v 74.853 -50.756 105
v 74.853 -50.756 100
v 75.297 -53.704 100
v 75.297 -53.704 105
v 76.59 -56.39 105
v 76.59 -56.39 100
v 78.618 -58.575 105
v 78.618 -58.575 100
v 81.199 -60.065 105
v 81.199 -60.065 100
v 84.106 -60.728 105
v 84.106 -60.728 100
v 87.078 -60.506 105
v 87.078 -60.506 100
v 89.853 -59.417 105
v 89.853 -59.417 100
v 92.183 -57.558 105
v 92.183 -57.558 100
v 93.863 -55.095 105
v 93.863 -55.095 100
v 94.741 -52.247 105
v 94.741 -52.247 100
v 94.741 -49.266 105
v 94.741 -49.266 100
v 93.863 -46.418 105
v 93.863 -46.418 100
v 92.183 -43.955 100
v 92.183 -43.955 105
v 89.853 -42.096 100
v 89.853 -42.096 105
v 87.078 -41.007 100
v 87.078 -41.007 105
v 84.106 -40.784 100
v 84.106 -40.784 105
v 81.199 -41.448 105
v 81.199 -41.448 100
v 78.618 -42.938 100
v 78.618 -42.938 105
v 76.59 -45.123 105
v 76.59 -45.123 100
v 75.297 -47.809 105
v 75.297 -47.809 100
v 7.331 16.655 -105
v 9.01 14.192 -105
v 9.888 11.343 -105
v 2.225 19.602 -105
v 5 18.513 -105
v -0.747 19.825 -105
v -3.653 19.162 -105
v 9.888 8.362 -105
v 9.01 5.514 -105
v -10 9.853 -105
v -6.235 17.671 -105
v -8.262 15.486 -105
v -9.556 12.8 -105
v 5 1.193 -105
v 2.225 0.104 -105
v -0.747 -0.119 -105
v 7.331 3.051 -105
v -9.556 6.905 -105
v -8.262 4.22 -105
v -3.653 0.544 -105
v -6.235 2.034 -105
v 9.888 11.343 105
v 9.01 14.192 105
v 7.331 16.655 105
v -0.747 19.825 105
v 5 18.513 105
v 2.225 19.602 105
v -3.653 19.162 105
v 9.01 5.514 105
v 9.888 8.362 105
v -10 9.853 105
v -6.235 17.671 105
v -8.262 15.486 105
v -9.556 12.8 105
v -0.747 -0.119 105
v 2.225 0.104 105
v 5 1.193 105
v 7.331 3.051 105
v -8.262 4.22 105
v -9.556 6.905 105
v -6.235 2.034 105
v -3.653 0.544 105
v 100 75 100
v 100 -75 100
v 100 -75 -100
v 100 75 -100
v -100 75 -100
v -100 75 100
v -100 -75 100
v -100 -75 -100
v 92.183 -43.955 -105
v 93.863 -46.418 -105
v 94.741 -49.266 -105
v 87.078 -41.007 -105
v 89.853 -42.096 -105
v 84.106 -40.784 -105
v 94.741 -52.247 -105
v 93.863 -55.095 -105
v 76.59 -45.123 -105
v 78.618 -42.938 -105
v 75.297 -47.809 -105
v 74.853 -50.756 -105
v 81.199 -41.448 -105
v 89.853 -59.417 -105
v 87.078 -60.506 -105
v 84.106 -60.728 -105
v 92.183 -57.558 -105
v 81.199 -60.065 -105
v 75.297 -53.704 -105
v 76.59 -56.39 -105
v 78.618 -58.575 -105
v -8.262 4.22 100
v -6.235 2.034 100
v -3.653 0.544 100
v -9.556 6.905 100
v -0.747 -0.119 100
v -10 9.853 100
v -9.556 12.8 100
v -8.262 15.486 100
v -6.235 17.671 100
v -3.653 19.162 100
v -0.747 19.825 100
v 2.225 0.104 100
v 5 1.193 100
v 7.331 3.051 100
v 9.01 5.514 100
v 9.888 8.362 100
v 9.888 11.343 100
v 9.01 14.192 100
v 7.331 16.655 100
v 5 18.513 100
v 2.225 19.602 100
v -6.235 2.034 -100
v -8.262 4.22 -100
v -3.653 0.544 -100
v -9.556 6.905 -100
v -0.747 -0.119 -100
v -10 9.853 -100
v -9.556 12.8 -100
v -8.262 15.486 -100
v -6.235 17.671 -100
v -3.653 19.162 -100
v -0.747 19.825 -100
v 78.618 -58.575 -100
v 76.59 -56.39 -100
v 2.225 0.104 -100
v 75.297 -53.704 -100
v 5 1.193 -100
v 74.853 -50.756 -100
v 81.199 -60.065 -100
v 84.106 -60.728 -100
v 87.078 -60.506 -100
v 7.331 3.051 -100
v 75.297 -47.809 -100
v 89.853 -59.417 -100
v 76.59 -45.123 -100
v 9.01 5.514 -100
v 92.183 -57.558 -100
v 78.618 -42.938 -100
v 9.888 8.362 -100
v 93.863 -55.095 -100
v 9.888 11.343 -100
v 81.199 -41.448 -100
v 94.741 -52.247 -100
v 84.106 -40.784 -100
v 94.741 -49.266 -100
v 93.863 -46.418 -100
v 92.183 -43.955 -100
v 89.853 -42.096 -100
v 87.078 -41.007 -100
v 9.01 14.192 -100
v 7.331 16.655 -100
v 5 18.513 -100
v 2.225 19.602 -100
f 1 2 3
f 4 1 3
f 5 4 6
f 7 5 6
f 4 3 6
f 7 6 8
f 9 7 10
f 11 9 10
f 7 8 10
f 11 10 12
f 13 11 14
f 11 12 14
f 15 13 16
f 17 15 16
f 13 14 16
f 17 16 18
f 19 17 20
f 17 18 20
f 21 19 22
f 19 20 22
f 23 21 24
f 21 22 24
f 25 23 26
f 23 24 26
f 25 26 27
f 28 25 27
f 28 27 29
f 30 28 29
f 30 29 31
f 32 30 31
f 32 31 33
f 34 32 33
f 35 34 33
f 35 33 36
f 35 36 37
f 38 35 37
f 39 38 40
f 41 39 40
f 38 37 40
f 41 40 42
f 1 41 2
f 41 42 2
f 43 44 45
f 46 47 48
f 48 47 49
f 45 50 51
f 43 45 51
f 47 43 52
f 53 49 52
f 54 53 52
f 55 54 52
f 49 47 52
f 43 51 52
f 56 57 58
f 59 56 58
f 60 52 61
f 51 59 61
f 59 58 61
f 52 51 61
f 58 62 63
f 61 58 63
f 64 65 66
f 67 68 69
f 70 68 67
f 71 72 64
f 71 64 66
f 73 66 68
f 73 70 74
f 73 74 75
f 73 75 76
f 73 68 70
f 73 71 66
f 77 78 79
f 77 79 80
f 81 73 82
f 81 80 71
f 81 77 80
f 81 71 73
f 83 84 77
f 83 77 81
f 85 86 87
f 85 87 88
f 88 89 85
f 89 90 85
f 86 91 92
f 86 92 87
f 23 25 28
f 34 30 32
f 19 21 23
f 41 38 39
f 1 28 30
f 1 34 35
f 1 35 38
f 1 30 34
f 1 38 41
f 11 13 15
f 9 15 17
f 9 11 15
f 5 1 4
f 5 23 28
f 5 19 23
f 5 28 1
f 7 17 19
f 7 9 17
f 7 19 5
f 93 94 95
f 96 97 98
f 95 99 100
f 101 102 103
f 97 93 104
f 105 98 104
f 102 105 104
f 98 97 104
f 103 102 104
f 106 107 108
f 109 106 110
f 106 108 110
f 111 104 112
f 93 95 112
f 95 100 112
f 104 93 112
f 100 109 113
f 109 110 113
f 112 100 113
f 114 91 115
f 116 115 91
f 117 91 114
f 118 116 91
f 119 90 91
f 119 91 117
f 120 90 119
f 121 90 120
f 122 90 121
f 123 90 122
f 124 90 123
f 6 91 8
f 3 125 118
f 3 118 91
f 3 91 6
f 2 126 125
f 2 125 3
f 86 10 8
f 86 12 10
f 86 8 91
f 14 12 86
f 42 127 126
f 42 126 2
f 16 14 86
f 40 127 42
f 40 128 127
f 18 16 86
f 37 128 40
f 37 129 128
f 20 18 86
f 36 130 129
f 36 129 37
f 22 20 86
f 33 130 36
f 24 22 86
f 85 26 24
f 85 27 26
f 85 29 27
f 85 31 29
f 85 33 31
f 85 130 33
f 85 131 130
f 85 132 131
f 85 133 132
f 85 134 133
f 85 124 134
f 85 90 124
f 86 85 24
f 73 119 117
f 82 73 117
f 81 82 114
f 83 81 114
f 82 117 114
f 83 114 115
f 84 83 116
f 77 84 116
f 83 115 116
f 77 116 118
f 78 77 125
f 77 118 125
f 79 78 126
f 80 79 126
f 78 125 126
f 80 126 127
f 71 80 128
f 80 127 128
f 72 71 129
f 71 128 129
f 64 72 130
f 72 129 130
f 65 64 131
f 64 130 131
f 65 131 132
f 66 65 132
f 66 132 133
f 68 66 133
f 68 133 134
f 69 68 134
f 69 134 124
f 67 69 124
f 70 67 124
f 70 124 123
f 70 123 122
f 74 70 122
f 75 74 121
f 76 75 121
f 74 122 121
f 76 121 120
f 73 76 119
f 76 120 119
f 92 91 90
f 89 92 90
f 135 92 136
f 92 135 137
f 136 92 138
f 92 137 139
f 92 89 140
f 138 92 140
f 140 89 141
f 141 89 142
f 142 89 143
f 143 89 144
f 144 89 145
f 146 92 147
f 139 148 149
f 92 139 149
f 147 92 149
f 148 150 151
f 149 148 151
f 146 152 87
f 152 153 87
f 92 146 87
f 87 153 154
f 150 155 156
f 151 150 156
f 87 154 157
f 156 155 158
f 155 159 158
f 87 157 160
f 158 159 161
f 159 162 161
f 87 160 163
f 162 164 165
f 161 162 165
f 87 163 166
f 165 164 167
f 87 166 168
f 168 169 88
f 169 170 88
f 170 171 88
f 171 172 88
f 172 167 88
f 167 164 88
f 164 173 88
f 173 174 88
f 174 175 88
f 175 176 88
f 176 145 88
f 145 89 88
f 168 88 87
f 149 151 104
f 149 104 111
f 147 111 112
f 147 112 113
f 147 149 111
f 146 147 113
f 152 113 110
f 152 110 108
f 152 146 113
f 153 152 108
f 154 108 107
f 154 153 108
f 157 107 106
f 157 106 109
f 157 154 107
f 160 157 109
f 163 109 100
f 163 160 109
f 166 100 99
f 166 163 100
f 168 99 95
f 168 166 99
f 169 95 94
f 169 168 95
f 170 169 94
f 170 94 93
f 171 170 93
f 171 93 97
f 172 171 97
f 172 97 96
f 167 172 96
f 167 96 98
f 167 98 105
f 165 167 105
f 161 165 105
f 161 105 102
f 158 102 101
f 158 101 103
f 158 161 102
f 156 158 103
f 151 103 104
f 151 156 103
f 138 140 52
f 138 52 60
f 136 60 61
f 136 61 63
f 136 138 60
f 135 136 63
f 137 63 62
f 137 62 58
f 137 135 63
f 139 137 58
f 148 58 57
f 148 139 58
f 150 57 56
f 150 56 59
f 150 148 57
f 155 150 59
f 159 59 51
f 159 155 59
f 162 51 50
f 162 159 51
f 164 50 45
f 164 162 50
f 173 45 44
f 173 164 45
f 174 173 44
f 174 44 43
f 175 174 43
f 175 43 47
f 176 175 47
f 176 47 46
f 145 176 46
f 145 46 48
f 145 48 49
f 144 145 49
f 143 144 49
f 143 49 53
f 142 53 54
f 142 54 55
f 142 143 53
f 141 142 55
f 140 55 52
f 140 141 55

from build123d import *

# Parameters (mm, degrees)
SKETCH_1_W      = 200
SKETCH_1_H      = 150
EXTRUDE_1_DEPTH = 100
SKETCH_2_R      = 10
EXTRUDE_2_DEPTH = 5


with BuildPart() as part:
    # 草图1 → 凸台-拉伸1 (new, symmetric)
    with BuildSketch(Plane.XY):
        Rectangle(SKETCH_1_W, SKETCH_1_H)
    extrude(amount=EXTRUDE_1_DEPTH, both=True)

    # 草图2 → 凸台-拉伸2 (add)
    with BuildSketch(Plane.XY.offset(100)):
        with Locations(Location((0, 9.852813742, 0), (0, 0, 180))):
            Circle(SKETCH_2_R)
        with Locations(Location((84.852813742, -50.756338931, 0), (0, 0, 180))):
            Circle(SKETCH_2_R)
    extrude_2 = extrude(amount=EXTRUDE_2_DEPTH)

    # 镜向1: 凸台-拉伸2 across plane
    add(extrude_2.mirror(Plane.XY))


solid = part.part
